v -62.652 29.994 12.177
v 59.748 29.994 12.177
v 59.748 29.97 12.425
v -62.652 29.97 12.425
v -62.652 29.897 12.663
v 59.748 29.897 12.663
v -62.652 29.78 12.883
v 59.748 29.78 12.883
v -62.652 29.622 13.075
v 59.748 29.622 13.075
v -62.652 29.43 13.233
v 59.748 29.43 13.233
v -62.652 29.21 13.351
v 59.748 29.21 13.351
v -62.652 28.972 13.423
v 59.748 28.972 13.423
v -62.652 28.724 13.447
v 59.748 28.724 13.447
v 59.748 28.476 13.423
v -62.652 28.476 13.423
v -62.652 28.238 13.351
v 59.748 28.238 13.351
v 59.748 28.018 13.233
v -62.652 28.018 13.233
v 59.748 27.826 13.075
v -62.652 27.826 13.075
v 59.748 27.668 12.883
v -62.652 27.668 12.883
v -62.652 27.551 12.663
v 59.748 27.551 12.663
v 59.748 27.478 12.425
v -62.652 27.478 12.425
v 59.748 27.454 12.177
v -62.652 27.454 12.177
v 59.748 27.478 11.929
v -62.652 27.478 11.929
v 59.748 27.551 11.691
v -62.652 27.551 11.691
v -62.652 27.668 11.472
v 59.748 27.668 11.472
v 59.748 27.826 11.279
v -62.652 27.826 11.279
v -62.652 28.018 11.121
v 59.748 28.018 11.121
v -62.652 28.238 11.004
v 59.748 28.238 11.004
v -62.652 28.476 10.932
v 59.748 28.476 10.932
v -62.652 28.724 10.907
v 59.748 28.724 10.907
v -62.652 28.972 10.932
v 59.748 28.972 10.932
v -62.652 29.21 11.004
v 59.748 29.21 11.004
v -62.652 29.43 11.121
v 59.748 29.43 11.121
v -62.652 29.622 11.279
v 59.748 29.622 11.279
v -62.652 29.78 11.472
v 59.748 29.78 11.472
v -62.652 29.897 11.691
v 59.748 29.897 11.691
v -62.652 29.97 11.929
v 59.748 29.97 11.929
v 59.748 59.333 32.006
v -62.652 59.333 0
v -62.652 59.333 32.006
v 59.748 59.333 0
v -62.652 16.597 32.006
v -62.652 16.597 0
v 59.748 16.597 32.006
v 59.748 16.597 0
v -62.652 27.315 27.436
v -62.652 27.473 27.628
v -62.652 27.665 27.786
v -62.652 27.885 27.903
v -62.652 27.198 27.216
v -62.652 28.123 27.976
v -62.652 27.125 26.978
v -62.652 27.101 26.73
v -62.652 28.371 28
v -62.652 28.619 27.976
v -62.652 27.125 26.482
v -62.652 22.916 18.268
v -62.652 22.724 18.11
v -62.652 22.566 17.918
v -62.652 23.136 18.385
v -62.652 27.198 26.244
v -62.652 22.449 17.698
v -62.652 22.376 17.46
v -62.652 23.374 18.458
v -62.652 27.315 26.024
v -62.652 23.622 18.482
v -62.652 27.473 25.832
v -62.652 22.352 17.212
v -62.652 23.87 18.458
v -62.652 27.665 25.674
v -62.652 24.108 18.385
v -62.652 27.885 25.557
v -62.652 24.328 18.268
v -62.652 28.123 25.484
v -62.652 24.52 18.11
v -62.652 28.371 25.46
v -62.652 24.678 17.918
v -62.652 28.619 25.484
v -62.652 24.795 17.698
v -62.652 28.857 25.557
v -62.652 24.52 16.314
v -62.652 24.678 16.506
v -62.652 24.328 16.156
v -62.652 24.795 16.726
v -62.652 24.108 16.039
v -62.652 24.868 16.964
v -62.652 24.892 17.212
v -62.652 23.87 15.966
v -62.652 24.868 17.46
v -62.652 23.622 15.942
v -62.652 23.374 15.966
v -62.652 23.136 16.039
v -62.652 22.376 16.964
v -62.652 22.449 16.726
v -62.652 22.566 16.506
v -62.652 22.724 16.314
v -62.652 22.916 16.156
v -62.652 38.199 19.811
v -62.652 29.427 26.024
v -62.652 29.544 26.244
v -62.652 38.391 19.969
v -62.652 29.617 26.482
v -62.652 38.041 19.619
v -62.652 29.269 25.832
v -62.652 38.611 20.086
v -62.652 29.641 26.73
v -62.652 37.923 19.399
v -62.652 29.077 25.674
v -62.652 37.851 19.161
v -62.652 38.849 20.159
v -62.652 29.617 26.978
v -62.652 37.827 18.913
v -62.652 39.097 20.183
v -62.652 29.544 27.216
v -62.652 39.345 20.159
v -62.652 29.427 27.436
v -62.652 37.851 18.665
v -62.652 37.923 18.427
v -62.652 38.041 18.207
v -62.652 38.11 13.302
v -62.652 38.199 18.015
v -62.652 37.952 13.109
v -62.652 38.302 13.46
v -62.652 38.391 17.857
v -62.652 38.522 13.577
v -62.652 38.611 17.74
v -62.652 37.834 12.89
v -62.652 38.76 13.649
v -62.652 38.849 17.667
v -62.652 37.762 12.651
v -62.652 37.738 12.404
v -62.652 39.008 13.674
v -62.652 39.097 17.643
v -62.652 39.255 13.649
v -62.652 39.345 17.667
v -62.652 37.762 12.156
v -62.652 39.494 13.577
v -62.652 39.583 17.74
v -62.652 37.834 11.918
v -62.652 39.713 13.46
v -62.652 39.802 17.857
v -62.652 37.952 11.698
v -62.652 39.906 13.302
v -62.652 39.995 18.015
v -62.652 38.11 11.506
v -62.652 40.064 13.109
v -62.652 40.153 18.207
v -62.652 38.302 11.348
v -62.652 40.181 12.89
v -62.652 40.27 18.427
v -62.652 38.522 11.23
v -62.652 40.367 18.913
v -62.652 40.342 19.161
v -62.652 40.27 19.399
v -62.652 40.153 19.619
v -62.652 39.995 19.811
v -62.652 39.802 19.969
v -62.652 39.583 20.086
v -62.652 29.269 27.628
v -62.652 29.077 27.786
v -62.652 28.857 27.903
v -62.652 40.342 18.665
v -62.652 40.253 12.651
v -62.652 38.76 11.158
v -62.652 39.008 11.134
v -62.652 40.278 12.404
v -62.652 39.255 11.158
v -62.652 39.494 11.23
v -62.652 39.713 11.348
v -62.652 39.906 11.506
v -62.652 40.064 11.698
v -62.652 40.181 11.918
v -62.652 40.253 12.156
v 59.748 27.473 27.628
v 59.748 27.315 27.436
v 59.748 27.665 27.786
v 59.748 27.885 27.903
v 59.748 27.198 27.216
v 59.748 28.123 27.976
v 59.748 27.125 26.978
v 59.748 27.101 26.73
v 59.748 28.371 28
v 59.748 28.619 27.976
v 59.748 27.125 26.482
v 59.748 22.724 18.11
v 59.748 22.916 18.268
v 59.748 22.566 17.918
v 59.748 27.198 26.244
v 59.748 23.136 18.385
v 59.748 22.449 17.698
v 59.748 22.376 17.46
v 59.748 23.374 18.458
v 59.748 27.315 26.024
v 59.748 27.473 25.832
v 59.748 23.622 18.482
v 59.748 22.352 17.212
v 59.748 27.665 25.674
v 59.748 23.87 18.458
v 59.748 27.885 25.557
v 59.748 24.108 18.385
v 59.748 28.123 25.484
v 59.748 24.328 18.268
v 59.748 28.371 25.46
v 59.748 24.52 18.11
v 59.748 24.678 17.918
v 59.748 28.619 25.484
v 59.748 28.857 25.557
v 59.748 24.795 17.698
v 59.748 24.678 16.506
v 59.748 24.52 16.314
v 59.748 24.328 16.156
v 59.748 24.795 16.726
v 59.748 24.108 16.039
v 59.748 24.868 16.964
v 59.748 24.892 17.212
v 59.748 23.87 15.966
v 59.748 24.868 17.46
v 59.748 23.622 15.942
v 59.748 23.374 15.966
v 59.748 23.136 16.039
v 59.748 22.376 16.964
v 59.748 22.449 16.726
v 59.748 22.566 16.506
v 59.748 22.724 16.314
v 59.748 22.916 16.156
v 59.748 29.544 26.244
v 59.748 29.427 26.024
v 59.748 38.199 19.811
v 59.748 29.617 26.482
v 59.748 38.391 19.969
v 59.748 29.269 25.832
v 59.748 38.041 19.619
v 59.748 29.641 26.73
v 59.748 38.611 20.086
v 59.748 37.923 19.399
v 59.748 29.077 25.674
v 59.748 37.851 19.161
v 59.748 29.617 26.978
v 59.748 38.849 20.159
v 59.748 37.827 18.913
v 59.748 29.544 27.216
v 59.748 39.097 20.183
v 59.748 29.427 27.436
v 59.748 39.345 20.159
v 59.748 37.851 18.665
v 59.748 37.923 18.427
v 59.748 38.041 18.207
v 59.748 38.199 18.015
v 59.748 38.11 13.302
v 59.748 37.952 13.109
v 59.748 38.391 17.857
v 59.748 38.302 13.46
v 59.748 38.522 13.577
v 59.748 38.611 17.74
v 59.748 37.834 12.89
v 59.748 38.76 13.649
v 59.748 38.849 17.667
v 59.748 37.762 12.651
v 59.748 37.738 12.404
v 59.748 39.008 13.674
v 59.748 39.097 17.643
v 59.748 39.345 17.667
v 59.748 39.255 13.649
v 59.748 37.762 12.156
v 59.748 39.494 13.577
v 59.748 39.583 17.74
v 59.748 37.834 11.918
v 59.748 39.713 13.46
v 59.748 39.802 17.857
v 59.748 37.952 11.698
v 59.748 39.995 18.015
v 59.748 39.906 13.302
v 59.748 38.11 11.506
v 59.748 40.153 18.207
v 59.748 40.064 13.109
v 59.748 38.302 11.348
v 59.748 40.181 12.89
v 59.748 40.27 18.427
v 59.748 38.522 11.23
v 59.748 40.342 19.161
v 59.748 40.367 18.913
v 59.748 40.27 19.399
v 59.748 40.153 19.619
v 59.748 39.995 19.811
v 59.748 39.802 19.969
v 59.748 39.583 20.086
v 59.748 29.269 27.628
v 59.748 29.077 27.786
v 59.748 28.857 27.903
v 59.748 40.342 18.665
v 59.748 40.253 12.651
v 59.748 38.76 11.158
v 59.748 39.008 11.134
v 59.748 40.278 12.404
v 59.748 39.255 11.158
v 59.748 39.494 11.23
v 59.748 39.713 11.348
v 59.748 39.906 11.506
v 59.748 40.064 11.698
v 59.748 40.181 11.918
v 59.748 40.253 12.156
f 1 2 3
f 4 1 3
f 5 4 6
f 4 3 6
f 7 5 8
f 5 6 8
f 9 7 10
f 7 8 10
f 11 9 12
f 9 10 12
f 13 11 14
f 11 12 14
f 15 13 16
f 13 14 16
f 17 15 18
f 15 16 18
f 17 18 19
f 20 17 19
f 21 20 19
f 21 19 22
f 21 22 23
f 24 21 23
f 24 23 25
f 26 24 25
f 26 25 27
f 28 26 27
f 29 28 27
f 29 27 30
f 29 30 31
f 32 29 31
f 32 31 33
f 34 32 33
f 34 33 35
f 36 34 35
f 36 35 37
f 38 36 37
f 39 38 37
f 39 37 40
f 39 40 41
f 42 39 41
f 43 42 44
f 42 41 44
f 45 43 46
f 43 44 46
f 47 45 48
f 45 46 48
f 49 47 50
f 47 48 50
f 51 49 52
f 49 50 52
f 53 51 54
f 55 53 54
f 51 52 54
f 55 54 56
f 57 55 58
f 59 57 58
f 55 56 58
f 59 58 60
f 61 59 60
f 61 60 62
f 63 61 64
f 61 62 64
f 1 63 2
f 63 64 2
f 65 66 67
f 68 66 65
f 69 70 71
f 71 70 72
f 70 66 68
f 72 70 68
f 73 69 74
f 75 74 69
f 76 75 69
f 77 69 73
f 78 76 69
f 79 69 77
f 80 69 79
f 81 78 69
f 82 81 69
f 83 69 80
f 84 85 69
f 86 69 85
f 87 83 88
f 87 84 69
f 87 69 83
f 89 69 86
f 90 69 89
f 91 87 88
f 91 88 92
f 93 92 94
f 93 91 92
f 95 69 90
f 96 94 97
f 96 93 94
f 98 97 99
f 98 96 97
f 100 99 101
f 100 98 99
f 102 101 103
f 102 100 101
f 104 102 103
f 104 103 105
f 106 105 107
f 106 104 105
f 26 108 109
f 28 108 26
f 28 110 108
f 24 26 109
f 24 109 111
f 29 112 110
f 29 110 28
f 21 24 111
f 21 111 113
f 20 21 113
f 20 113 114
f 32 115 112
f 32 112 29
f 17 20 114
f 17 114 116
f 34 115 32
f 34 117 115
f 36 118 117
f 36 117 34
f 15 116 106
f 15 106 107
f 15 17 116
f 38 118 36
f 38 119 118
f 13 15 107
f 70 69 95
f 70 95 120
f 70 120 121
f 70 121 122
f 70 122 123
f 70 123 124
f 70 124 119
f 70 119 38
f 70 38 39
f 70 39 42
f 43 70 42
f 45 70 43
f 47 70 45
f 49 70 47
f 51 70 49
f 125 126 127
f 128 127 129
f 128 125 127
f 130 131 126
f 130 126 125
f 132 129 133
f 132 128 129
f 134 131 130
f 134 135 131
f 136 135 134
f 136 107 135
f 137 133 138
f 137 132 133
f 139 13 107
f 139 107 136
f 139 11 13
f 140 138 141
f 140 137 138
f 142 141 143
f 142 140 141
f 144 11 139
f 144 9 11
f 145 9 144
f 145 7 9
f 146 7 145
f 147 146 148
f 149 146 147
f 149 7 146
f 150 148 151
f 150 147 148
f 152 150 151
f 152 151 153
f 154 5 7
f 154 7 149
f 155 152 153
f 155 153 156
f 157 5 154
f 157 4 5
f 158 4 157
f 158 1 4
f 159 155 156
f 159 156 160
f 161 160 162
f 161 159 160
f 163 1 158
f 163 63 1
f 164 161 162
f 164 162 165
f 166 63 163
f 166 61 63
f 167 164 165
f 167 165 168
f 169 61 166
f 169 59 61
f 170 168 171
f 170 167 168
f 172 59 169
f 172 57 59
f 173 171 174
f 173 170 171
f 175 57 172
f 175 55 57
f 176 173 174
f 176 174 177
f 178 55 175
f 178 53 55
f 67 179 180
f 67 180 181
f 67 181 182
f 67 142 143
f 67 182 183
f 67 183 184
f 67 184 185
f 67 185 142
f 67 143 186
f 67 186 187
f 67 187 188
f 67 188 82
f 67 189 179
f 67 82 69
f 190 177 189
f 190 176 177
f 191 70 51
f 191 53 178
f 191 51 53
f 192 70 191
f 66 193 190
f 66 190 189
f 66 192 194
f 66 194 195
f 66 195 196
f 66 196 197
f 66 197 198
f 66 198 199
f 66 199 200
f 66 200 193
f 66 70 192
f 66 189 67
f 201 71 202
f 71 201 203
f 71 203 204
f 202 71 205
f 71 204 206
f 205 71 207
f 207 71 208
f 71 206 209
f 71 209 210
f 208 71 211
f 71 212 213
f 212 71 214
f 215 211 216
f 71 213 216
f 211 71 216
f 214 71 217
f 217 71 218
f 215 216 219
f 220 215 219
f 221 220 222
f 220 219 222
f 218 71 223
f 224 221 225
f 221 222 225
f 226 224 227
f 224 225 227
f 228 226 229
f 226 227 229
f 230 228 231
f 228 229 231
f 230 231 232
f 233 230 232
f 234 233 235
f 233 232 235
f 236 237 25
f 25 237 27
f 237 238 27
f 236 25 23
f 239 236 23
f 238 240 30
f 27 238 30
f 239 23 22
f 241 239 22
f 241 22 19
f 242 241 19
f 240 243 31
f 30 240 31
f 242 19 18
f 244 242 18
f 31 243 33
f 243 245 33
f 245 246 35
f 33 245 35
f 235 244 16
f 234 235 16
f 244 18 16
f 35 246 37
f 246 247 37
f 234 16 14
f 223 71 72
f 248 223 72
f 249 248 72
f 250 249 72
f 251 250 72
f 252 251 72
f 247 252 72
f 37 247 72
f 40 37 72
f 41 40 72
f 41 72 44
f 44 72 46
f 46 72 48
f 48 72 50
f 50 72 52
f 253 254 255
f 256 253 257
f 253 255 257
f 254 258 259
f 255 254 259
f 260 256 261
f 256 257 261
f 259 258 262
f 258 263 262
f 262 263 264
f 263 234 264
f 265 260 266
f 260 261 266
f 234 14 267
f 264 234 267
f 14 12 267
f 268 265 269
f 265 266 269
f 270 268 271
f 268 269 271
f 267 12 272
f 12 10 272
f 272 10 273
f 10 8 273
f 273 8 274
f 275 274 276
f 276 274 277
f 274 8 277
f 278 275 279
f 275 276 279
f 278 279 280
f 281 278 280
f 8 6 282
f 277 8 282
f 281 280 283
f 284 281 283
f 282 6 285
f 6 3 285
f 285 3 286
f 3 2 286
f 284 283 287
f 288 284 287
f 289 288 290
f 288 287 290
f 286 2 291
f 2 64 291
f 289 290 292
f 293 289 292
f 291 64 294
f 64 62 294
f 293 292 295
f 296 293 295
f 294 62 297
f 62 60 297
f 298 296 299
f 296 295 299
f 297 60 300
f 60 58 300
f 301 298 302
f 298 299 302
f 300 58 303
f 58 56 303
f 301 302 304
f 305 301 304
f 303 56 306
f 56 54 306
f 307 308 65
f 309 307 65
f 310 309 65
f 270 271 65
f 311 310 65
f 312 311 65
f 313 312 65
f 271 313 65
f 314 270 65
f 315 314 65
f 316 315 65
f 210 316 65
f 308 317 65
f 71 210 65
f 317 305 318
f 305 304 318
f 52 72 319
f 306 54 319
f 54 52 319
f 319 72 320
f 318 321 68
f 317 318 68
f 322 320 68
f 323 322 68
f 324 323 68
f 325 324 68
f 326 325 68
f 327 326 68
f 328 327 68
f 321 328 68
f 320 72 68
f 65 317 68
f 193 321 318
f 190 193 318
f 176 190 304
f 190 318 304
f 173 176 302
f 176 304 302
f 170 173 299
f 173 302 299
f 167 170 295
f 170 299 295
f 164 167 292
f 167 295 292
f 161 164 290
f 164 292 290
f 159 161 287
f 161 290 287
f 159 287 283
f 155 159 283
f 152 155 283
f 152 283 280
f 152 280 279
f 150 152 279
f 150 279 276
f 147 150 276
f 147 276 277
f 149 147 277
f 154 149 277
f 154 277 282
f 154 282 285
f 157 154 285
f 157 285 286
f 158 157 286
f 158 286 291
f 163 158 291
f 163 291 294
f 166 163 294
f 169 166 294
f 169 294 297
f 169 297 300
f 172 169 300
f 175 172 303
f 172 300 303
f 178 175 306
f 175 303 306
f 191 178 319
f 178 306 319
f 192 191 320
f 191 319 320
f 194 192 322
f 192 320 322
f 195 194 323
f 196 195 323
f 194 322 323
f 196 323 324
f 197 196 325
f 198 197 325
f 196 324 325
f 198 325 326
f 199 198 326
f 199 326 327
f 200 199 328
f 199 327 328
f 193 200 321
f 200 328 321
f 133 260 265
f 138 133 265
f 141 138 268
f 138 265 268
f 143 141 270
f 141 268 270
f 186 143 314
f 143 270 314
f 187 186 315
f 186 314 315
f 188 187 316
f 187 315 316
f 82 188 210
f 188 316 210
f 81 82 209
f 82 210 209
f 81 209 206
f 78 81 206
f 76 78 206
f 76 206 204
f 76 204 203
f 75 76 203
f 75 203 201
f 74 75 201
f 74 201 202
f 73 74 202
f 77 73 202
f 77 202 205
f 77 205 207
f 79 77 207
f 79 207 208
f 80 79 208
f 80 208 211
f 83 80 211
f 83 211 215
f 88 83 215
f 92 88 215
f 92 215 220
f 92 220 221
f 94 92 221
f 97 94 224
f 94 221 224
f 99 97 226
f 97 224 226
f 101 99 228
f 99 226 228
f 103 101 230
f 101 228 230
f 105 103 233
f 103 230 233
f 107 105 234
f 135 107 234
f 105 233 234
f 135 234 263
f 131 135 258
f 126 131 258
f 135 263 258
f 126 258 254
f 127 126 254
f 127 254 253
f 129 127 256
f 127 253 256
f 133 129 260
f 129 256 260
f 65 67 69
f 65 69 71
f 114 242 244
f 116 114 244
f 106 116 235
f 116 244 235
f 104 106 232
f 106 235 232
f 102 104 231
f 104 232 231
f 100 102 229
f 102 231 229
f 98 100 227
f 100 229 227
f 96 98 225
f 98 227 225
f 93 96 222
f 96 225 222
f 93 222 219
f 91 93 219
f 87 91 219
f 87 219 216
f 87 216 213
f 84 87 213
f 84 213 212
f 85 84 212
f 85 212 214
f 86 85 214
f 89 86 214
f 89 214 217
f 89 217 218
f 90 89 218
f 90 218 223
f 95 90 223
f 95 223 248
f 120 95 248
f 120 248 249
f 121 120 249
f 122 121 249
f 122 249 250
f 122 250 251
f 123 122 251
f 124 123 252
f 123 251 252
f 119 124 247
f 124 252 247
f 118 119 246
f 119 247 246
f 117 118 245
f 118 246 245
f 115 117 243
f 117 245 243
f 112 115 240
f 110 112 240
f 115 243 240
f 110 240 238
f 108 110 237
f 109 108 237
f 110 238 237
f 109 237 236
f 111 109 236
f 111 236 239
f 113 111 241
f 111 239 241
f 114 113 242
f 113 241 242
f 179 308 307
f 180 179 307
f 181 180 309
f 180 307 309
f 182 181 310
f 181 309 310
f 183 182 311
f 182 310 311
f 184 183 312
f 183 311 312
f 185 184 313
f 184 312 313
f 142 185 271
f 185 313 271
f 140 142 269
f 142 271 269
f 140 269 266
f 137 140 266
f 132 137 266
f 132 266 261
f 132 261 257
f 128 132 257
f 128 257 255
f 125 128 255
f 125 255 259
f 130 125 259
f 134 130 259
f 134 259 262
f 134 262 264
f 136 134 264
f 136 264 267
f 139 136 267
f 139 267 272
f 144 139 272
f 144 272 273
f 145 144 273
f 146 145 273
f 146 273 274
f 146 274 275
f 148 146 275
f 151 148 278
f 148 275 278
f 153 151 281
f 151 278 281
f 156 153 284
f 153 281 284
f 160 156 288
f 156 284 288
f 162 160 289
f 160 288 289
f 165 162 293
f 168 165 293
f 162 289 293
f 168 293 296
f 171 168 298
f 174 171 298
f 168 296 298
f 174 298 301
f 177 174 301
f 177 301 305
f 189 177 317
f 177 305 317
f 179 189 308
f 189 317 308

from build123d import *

# Parameters (mm, degrees)
F0_W     = 122.3997175694
F0_H     = 42.7361652255
F1_DEPTH = 32.0060774684
F5_D     = 2.54


# Not quite as in the source:
# - the program builds the solid bodies; features that only make, move or delete a surface that nothing else refers to are left out


with BuildPart() as f1:
    # F0 (on Top) → F1 (new body)
    with BuildSketch(Plane.XY):
        with Locations((-1.4522224665, 37.9646681249)):
            Rectangle(F0_W, F0_H)
    extrude(amount=F1_DEPTH)

    # F5 (through all)
    with Locations(Plane(origin=(-62.6520812511, 0, 0), x_dir=(0, -1, 0), z_dir=(-1, 0, 0))):
        with Locations((-28.3709894866, 26.730036363), (-23.6220490187, 17.2120258212), (-28.7239328027, 12.1772345155), (-39.0075407922, 12.403704226), (-39.0968136489, 18.9130250365)):
            Hole(F5_D / 2)


solid = f1.part
